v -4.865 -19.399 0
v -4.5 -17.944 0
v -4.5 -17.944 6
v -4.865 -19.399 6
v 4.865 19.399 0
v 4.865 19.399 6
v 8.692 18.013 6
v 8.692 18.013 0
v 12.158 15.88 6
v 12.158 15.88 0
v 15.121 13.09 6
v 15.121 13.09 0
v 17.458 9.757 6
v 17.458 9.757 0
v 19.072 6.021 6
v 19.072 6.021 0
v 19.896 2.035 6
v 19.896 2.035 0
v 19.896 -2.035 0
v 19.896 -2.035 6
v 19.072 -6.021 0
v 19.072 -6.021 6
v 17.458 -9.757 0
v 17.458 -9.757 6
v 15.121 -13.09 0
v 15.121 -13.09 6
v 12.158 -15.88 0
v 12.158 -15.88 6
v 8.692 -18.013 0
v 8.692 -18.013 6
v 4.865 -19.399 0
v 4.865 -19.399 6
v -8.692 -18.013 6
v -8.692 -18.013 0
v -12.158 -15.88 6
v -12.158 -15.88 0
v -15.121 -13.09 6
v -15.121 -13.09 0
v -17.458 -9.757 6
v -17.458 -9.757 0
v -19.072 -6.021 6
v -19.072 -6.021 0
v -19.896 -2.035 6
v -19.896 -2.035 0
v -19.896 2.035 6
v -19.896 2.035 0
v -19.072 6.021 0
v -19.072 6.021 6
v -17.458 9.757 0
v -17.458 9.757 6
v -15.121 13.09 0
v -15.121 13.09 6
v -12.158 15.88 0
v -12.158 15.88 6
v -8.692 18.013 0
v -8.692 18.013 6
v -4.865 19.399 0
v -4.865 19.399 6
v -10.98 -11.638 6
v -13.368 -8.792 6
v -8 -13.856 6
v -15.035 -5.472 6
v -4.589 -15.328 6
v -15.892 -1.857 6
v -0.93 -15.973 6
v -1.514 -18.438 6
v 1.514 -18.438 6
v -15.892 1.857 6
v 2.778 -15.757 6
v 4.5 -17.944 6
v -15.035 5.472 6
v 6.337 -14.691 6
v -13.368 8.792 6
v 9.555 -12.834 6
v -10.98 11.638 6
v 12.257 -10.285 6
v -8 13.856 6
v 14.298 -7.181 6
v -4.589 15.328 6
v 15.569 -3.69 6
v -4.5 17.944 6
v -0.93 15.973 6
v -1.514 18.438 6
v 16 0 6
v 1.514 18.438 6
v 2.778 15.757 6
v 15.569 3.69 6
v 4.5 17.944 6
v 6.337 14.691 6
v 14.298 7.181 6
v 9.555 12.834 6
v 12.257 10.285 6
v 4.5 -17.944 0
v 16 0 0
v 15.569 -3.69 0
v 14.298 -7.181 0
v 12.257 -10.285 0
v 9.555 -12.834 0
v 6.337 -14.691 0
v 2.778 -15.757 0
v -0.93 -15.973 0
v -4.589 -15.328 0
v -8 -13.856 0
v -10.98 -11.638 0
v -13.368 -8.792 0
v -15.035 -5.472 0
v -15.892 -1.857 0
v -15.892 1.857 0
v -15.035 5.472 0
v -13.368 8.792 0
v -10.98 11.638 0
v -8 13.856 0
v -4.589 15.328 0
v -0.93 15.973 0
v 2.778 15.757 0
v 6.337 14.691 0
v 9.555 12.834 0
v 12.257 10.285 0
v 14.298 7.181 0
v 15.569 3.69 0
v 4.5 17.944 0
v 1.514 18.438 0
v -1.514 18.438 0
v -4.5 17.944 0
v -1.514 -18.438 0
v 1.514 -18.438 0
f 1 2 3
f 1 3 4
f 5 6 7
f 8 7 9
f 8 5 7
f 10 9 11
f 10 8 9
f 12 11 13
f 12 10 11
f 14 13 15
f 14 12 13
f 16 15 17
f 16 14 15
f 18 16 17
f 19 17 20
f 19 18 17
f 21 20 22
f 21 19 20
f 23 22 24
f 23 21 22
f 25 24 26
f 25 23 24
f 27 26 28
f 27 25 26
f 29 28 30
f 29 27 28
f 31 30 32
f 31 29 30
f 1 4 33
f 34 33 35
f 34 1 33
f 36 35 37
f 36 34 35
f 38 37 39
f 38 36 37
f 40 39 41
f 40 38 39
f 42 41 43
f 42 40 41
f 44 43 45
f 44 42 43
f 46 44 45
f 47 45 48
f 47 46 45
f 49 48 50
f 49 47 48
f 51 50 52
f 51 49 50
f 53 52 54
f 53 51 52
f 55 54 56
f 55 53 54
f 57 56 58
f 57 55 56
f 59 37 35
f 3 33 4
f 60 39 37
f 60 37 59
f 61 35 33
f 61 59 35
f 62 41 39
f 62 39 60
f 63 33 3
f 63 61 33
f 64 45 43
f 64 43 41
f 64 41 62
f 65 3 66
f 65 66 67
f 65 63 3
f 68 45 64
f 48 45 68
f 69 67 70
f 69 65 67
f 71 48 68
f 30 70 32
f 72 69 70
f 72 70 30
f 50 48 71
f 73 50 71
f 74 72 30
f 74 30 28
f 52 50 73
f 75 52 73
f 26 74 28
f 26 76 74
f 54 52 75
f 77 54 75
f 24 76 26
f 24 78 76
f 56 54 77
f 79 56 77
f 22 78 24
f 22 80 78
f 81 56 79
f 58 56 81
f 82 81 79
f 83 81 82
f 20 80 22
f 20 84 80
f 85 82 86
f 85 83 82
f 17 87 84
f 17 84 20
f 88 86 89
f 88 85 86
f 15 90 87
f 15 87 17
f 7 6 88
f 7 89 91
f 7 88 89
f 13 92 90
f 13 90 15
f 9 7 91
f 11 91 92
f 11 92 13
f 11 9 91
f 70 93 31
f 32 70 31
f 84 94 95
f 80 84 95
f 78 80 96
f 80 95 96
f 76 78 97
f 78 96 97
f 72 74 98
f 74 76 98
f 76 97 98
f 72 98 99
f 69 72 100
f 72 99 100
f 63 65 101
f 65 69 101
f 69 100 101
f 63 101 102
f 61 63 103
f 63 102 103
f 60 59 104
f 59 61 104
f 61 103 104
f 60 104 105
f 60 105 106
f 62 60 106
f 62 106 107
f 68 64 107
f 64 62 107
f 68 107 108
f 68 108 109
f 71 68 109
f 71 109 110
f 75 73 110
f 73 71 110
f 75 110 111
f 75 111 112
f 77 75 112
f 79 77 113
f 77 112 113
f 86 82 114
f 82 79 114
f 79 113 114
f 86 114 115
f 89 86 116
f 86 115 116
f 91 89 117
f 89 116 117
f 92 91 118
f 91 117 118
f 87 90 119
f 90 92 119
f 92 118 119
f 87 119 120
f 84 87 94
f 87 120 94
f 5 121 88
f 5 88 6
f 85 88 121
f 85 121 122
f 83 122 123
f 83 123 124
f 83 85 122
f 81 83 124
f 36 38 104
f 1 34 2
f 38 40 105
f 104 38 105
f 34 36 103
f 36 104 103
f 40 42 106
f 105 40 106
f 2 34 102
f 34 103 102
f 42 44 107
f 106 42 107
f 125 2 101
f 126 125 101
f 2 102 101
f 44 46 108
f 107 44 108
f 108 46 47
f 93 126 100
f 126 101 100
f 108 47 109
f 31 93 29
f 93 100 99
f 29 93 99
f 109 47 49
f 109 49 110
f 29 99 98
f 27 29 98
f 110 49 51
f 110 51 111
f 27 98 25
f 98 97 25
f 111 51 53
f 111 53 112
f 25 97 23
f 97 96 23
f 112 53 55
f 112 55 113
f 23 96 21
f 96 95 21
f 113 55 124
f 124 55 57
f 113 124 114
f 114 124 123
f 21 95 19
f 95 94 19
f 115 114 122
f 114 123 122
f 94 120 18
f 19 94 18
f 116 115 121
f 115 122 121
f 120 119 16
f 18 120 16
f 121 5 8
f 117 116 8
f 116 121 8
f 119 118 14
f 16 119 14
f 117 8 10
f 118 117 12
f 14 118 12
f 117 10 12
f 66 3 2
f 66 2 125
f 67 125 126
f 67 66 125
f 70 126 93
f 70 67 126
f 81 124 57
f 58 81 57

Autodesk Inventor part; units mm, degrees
ref_plane "YZ Plane" through (0, 0, 0) normal (1, 0, 0) x (0, 1, 0)
ref_plane "XZ Plane" through (0, 0, 0) normal (0, 1, 0) x (-1, 0, 0)
ref_plane "XY Plane" through (0, 0, 0) normal (0, 0, 1) x (1, 0, 0)
sketch "Sketch1" plane through (0, 0, 0) normal (0, 0, 1) x (1, 0, 0)
  circle A0 centre (0, 0) radius 16
  circle A1 centre (0, 0) radius 20
  dimension "d0" = 32
  dimension "d1" = 40
extrude "Extrusion1" add sketch "Sketch1" along normal blind 6
sketch "Sketch2" plane through (0, 0, 6) normal (0, 0, 1) x (1, 0, 0)
  line L0 (-4.3061, 18.5) -> (4.6939, 18.5) construction
  line L1 (-4.5, 20) -> (4.5, 20) construction
  circle A0 centre (0, 0) radius 20 construction
  circle A1 centre (0, 0) radius 20 projected
  arc A2 (4.8649, 19.3993) -> (-4.8649, 19.3993) centre (0, 0) ccw
  arc A3 (4.5, 17.9444) -> (-4.5, 17.9444) centre (0, 0) ccw
  line L2 (4.5, 17.9444) -> (4.8649, 19.3993)
  line L3 (-4.5, 17.9444) -> (-4.8649, 19.3993)
  line L4 (-4.8649, 19.3993) -> (0, 0) construction
  line L5 (4.8649, 19.3993) -> (0, 0) construction
  circle A4 centre (0, 0) radius 16 construction
  line L6 (-16, 0) -> (16, 0) construction
  arc A5 (-4.8649, -19.3993) -> (4.8649, -19.3993) centre (0, 0) ccw
  arc A6 (-4.5, -17.9444) -> (4.5, -17.9444) centre (0, 0) ccw
  line L7 (4.5, -17.9444) -> (4.8649, -19.3993)
  line L8 (-4.5, -17.9444) -> (-4.8649, -19.3993)
  point P0 (0, 20)
  point P1 (0, -20)
  dimension "d4" = 9
  dimension "d5" = 1.5
extrude "Extrusion2" cut sketch "Sketch2" against normal through all contours L2 A3 L3 A1 | A1 L8 A6 L7
equation "\"d1\" = BattECOD"
equation "\"d5\" = GripLength"
equation "\"BattECOD\" = 40"
equation "\"GripLength\" = 1.5"
properties part number "Battery Tube Collar"
